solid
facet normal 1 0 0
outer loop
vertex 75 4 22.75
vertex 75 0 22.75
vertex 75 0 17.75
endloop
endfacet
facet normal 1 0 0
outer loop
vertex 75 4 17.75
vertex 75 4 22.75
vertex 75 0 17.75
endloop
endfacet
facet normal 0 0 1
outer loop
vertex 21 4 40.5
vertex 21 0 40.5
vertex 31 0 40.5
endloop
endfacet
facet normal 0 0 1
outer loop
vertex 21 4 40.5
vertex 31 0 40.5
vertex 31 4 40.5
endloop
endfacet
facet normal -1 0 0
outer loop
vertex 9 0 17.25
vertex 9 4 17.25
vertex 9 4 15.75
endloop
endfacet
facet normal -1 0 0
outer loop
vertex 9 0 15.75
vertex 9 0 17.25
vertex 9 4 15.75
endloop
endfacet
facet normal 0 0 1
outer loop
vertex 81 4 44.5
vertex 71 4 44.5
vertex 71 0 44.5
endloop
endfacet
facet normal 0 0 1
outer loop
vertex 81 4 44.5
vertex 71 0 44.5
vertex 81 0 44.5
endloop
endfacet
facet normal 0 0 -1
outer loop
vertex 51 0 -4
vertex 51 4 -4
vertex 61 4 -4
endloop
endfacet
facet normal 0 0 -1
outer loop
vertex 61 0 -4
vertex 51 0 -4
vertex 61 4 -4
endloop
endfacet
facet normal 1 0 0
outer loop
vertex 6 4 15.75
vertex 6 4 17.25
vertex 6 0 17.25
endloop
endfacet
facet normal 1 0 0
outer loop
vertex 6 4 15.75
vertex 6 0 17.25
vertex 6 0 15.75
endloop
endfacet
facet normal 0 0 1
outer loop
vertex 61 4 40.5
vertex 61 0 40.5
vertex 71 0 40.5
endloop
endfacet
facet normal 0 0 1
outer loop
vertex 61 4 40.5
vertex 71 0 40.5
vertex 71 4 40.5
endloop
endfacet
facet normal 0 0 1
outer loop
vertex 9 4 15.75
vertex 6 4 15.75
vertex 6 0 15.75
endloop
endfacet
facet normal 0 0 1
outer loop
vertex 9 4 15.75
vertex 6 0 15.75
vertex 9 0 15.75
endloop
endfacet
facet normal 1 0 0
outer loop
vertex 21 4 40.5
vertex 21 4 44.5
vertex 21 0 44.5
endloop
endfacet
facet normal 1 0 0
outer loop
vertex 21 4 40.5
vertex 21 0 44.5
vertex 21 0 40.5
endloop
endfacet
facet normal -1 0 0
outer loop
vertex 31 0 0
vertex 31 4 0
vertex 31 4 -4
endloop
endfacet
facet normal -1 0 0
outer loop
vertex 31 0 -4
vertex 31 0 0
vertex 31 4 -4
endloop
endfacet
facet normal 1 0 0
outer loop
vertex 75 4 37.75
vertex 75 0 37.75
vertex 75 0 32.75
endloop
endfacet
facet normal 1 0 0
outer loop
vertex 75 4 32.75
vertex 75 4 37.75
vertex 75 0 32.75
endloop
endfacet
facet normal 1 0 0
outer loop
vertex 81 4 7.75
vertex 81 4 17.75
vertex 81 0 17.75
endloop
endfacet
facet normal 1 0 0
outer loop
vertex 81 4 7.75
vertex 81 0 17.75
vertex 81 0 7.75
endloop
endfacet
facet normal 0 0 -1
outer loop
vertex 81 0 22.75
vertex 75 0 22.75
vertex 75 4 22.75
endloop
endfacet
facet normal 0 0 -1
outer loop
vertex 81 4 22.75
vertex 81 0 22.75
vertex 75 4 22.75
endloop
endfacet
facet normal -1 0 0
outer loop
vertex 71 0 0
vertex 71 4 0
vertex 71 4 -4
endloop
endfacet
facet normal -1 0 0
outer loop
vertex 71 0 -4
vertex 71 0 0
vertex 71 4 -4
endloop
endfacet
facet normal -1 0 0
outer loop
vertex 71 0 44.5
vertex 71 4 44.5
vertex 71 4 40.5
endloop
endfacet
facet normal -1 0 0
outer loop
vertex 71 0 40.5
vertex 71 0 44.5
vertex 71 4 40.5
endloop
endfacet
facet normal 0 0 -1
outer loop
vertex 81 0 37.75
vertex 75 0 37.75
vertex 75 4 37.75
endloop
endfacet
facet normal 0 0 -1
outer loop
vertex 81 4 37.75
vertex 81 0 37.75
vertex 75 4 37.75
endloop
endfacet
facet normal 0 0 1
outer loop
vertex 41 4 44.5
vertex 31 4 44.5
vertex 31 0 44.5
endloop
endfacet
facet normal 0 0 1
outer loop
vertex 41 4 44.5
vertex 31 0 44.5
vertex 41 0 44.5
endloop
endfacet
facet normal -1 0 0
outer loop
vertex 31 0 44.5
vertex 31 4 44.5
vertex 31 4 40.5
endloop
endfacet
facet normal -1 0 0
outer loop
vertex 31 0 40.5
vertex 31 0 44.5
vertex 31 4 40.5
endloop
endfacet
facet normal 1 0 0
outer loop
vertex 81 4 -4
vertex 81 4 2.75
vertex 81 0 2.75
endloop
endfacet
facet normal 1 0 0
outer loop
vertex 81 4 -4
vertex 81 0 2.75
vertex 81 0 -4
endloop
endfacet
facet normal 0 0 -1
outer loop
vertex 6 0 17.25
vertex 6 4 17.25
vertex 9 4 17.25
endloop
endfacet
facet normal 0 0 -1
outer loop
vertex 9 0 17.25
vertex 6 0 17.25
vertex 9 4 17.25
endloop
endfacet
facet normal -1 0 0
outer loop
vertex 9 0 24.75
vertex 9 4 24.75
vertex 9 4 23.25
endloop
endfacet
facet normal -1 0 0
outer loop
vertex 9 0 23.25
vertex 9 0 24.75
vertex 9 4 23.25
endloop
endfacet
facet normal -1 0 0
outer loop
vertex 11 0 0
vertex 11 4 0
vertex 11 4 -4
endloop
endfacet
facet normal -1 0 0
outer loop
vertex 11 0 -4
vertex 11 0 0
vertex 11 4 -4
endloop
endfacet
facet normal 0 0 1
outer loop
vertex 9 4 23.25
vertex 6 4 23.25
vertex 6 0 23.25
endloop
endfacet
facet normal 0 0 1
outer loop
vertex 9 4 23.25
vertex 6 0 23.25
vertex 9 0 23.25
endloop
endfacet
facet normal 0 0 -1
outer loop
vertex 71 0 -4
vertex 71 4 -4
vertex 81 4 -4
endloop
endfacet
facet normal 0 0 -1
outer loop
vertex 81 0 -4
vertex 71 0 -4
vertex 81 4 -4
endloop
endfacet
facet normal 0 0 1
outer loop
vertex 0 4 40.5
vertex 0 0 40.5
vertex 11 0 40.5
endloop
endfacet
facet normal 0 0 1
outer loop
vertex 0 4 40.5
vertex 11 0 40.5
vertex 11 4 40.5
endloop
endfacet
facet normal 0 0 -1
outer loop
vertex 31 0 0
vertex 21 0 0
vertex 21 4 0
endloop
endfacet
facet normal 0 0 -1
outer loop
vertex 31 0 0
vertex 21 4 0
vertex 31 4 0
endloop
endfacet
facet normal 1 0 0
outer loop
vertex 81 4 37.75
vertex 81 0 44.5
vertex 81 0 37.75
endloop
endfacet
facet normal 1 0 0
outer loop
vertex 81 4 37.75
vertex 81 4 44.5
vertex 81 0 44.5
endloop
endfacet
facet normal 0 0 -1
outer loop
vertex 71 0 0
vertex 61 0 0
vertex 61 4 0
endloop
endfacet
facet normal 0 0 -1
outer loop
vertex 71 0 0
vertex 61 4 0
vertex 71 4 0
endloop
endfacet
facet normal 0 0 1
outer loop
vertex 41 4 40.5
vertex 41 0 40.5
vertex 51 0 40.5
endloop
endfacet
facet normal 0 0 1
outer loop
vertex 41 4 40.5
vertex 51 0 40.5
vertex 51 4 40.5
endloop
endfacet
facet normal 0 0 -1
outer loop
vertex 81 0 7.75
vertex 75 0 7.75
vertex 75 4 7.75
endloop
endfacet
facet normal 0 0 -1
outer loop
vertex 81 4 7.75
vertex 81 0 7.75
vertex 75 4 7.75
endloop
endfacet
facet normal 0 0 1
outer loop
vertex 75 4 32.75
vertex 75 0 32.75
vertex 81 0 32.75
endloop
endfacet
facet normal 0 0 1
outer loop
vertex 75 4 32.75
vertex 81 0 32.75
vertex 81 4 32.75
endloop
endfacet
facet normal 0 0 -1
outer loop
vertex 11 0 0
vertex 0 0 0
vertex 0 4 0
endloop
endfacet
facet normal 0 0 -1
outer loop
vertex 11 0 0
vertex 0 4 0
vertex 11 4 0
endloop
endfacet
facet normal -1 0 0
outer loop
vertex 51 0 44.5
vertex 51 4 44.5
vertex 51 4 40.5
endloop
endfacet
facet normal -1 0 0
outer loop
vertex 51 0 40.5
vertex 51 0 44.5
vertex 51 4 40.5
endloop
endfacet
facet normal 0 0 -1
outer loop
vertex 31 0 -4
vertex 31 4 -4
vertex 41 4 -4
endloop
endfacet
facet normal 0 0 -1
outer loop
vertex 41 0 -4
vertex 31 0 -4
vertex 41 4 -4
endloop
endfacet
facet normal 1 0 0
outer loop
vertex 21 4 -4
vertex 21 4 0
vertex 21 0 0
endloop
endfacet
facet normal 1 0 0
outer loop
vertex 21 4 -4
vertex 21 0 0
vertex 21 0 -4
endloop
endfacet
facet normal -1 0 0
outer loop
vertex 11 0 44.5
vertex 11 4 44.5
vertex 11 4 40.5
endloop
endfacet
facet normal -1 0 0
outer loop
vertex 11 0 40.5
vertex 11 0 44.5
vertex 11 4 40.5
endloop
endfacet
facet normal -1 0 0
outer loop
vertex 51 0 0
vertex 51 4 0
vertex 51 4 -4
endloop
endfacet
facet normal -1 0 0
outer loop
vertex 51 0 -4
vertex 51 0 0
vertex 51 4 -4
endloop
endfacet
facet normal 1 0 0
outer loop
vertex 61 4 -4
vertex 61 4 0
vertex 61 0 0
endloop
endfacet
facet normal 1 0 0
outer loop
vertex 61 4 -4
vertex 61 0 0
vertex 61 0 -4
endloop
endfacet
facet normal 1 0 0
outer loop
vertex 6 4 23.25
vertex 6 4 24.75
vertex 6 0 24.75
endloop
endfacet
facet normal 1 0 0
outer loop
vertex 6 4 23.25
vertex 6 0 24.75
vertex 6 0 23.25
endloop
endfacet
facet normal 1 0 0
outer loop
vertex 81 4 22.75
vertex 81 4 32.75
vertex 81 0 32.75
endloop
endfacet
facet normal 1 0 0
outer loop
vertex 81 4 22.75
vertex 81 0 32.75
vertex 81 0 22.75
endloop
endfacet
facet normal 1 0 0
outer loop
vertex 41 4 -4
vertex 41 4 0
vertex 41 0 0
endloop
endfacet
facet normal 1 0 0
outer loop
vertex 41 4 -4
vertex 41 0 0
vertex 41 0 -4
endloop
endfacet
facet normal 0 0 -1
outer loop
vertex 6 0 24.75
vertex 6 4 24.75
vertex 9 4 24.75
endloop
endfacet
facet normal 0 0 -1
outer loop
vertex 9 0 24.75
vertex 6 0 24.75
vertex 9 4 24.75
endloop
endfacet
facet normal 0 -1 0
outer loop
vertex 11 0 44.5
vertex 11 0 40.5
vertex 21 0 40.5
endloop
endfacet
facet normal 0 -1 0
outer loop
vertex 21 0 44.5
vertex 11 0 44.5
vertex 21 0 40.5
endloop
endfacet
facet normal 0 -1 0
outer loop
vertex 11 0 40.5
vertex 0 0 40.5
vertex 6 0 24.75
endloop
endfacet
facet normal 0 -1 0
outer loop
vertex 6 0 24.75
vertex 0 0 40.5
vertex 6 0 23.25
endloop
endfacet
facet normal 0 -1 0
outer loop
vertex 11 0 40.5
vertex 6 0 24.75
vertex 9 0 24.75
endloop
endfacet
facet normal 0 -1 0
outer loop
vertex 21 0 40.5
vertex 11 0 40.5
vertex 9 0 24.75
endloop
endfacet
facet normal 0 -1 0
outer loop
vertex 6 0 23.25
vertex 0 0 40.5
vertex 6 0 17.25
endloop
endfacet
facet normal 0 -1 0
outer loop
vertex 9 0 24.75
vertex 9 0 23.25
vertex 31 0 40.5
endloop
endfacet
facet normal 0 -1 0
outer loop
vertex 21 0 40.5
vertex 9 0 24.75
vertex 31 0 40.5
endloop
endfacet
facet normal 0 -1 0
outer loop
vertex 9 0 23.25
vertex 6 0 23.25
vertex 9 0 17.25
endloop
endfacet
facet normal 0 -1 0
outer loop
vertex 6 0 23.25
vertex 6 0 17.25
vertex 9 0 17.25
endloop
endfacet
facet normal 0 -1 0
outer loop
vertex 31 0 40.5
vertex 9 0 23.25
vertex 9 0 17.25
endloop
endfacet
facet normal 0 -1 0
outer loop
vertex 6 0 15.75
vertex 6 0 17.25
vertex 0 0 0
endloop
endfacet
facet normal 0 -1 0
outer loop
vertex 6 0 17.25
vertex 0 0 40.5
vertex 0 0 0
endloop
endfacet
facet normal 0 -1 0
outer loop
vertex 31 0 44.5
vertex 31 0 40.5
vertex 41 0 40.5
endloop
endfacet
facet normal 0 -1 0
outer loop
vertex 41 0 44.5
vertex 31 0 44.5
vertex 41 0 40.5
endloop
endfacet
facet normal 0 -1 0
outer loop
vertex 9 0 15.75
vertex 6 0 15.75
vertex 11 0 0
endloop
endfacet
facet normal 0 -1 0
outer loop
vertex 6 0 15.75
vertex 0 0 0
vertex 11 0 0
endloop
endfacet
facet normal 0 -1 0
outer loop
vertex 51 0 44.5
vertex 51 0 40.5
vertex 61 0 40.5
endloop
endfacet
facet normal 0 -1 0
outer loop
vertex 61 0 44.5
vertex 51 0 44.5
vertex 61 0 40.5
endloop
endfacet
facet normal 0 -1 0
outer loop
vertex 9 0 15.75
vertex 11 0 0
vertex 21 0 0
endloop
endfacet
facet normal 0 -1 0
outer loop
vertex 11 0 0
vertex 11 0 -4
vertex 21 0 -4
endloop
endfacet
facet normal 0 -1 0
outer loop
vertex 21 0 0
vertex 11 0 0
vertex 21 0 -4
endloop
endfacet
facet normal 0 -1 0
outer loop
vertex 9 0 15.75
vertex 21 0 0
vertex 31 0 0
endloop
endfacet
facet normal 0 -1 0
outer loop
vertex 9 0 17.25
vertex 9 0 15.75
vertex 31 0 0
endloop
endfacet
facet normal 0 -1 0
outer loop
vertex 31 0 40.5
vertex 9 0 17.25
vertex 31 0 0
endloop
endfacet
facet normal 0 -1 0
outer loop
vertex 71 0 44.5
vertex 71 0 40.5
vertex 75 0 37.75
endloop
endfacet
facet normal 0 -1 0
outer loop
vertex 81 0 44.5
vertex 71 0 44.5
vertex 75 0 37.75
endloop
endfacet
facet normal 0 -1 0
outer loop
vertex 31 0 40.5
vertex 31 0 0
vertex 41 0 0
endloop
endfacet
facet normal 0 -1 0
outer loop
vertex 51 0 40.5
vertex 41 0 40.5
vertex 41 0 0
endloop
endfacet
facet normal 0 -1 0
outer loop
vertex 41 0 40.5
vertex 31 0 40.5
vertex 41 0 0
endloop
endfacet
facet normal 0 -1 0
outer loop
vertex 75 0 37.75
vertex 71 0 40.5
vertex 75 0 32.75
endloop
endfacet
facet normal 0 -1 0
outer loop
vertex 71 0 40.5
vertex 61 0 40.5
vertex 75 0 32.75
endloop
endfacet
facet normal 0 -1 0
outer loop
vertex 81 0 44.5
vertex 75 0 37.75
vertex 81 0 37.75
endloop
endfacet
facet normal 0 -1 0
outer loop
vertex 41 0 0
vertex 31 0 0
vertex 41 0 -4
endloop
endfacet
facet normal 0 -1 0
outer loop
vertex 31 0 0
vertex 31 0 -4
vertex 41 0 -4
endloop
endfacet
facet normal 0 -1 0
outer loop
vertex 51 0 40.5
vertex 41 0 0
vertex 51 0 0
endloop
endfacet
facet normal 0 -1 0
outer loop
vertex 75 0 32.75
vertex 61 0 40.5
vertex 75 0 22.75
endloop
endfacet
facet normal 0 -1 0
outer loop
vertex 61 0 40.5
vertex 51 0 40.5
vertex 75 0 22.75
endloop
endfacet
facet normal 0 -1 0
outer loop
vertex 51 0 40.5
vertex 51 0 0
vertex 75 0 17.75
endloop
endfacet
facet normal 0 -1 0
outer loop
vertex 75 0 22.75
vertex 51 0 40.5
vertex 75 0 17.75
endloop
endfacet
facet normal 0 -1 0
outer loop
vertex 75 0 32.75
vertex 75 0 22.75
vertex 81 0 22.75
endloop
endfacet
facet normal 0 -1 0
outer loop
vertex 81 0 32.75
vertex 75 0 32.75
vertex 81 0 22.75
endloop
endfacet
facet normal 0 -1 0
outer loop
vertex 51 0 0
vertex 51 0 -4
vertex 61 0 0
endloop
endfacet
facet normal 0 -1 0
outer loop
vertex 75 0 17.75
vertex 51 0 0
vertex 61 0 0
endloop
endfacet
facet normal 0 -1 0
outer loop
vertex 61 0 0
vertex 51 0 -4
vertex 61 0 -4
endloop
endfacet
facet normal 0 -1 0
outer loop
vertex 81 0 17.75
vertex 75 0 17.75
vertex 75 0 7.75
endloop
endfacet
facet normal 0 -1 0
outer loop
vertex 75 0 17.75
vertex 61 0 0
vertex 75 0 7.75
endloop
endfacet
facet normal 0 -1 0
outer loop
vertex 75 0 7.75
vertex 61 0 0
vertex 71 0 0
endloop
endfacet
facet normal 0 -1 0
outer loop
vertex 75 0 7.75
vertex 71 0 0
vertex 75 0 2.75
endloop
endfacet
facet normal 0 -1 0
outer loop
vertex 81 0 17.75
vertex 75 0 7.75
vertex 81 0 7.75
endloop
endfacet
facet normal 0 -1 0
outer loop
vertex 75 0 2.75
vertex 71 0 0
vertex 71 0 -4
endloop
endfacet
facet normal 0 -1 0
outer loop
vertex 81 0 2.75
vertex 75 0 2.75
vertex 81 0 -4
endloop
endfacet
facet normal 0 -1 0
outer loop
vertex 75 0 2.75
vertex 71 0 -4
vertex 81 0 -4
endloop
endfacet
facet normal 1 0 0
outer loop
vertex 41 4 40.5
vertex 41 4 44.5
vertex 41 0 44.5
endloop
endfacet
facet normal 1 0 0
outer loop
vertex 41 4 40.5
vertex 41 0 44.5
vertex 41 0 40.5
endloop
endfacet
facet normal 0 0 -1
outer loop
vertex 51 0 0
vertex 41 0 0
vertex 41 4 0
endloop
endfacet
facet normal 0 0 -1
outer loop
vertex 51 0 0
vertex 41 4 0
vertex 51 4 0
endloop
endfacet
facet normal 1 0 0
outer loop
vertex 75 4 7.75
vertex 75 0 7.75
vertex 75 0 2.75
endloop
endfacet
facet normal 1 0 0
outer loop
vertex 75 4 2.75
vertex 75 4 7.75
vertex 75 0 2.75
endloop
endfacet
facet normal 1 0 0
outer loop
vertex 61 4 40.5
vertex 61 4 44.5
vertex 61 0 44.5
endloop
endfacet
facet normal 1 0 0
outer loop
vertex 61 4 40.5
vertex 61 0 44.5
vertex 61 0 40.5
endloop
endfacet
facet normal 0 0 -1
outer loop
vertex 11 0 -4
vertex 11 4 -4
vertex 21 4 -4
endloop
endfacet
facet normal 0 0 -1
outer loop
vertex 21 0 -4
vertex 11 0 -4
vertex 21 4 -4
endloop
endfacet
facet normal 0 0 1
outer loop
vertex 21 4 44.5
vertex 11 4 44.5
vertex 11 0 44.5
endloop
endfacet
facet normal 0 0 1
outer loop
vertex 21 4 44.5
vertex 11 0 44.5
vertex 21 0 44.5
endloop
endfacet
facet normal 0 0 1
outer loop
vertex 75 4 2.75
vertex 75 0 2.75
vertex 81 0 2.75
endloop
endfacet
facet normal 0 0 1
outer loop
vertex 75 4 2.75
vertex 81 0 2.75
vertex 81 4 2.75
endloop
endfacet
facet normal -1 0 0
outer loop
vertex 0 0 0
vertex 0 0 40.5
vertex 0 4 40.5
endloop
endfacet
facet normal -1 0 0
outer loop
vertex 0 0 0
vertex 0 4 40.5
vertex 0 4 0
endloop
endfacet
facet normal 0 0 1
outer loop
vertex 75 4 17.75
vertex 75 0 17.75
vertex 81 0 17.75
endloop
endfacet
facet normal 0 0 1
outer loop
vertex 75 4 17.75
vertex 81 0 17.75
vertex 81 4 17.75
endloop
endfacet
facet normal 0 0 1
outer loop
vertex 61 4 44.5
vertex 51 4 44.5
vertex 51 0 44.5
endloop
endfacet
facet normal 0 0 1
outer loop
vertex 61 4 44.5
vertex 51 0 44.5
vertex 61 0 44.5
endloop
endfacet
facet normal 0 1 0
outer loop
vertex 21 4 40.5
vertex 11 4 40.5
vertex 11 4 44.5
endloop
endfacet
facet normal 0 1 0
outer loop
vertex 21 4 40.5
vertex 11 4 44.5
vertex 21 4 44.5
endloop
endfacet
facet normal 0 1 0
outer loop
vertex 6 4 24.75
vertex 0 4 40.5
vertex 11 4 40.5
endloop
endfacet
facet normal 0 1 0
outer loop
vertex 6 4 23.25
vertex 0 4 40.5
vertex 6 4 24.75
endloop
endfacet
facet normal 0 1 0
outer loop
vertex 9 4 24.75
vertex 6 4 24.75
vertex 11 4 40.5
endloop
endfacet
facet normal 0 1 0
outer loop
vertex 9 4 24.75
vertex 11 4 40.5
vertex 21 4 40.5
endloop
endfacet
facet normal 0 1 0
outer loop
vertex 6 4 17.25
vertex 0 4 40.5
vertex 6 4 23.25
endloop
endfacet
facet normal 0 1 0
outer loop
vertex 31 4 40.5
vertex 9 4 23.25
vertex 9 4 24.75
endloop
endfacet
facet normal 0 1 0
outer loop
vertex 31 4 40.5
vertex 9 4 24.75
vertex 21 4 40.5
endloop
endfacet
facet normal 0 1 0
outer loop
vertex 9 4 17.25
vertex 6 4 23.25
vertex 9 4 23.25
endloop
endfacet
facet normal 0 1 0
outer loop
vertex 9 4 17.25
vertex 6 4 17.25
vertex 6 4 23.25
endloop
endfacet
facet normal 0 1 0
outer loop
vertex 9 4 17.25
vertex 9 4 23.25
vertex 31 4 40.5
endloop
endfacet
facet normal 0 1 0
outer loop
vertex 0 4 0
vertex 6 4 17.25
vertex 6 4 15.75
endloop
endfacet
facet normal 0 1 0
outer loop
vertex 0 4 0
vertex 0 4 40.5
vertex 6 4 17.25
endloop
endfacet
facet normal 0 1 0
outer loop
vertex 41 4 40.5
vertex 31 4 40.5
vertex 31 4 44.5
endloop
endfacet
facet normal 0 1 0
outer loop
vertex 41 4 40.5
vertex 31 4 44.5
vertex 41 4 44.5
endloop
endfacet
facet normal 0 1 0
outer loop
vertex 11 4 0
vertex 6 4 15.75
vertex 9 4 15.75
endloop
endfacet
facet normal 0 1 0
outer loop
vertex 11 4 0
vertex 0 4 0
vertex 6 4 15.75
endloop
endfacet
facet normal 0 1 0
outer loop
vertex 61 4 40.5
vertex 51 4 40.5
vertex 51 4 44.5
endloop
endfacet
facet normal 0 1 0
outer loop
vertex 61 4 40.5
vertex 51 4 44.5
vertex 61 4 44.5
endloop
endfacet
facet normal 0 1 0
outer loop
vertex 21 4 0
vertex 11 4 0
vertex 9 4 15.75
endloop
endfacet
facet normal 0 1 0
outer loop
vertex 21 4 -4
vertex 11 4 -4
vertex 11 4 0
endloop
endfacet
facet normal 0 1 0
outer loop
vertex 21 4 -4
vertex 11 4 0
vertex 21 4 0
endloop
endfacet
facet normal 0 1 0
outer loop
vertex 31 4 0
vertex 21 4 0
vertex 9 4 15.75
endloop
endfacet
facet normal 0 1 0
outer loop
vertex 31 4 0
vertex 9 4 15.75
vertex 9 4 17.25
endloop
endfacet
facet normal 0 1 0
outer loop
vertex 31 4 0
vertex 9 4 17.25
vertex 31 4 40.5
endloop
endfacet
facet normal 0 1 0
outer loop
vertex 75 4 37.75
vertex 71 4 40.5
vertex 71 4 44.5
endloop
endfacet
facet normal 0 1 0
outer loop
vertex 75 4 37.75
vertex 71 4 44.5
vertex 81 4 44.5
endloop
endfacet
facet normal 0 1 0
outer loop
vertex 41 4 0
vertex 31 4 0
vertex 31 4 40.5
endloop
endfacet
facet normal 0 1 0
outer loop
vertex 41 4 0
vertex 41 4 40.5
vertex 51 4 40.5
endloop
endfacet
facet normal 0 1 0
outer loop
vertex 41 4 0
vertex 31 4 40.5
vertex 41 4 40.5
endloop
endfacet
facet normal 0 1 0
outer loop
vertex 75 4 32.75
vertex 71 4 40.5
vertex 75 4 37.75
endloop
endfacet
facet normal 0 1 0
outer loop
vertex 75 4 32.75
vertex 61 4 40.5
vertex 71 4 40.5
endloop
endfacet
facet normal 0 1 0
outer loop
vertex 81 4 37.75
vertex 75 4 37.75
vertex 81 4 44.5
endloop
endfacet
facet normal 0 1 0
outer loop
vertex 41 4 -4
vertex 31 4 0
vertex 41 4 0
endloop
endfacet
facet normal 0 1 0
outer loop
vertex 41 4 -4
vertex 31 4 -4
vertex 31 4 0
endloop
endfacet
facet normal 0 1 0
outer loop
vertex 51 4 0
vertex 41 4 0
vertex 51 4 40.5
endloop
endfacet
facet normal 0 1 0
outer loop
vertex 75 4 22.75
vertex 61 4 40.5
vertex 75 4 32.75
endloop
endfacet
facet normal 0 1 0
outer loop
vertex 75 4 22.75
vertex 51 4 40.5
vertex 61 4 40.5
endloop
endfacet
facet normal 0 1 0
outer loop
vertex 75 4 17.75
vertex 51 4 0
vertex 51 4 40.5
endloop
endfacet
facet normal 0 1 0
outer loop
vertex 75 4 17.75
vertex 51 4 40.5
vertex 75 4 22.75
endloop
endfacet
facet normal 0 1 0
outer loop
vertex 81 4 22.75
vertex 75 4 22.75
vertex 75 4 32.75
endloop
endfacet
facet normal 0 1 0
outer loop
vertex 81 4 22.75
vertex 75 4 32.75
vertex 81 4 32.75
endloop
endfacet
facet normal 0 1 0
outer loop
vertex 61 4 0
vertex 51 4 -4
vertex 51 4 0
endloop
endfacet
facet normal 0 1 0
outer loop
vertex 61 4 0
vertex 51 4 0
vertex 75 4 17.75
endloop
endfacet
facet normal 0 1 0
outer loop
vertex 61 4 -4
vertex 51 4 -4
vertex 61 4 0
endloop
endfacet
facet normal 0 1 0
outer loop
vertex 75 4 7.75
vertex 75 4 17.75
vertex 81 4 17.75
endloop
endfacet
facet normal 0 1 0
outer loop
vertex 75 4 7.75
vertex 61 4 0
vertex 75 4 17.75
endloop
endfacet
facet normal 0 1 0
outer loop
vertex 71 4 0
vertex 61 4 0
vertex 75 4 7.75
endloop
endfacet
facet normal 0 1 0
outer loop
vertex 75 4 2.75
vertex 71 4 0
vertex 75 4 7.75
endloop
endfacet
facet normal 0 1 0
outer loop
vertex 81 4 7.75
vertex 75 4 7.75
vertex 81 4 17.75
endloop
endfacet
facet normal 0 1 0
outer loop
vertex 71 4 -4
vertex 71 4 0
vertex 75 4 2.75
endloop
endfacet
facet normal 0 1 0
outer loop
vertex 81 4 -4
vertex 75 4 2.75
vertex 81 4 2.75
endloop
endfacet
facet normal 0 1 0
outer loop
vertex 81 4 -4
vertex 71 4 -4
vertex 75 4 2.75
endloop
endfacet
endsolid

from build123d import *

# Parameters (mm, degrees)
SKETCH1_W           = 75
SKETCH1_H           = 40.5
BOSS_EXTRUDE1_DEPTH = 4
SKETCH2_W           = 2.75
SKETCH2_H           = 4
SKETCH2_W_2         = 10
BOSS_EXTRUDE2_DEPTH = 6
SKETCH3_W           = 10
SKETCH3_H           = 4
BOSS_EXTRUDE3_DEPTH = 4
LPATTERN1_COUNT     = 4
LPATTERN1_PITCH     = 20
SKETCH4_W           = 3
SKETCH4_H           = 1.5
CUT_EXTRUDE1_DEPTH  = 5


with BuildPart() as part:
    # Sketch1 → Boss-Extrude1 (new body)
    with BuildSketch(Plane(origin=(0, 0, 0), x_dir=(1, 0, 0), z_dir=(0, 1, 0))):
        with Locations((37.5, -20.25)):
            Rectangle(SKETCH1_W, SKETCH1_H)
    extrude(amount=BOSS_EXTRUDE1_DEPTH)

    # Sketch2 → Boss-Extrude2 (add)
    with BuildSketch(Plane(origin=(75, 0, 0), x_dir=(0, 0, -1), z_dir=(1, 0, 0))):
        with Locations((-39.125, 2)):
            Rectangle(SKETCH2_W, SKETCH2_H)
        with Locations((-27.75, 2)):
            Rectangle(SKETCH2_W_2, SKETCH2_H)
        with Locations((-12.75, 2)):
            Rectangle(SKETCH2_W_2, SKETCH2_H)
        with Locations((-1.375, 2)):
            Rectangle(SKETCH2_W, SKETCH2_H)
    extrude(amount=BOSS_EXTRUDE2_DEPTH)

    # Sketch3 → Boss-Extrude3 (add, through all)
    with BuildSketch(Plane(origin=(0, 4, 0), x_dir=(1, 0, 0), z_dir=(0, 1, 0))):
        with Locations((76, 2)):
            Rectangle(SKETCH3_W, SKETCH3_H)
        with Locations((76, -42.5)):
            Rectangle(SKETCH3_W, SKETCH3_H)
    boss_extrude3 = extrude(amount=-BOSS_EXTRUDE3_DEPTH)

    # LPattern1: Boss-Extrude3 ×4
    with Locations(*[(-i * LPATTERN1_PITCH, 0, 0) for i in range(1, LPATTERN1_COUNT)]):
        add(boss_extrude3)

    # Sketch4 → Cut-Extrude1 (cut, through all)
    with BuildSketch(Plane(origin=(0, 4, 0), x_dir=(1, 0, 0), z_dir=(0, 1, 0))):
        with Locations((7.5, -24)):
            Rectangle(SKETCH4_W, SKETCH4_H)
        with Locations((7.5, -16.5)):
            Rectangle(SKETCH4_W, SKETCH4_H)
    extrude(amount=-CUT_EXTRUDE1_DEPTH, mode=Mode.SUBTRACT)


solid = part.part
